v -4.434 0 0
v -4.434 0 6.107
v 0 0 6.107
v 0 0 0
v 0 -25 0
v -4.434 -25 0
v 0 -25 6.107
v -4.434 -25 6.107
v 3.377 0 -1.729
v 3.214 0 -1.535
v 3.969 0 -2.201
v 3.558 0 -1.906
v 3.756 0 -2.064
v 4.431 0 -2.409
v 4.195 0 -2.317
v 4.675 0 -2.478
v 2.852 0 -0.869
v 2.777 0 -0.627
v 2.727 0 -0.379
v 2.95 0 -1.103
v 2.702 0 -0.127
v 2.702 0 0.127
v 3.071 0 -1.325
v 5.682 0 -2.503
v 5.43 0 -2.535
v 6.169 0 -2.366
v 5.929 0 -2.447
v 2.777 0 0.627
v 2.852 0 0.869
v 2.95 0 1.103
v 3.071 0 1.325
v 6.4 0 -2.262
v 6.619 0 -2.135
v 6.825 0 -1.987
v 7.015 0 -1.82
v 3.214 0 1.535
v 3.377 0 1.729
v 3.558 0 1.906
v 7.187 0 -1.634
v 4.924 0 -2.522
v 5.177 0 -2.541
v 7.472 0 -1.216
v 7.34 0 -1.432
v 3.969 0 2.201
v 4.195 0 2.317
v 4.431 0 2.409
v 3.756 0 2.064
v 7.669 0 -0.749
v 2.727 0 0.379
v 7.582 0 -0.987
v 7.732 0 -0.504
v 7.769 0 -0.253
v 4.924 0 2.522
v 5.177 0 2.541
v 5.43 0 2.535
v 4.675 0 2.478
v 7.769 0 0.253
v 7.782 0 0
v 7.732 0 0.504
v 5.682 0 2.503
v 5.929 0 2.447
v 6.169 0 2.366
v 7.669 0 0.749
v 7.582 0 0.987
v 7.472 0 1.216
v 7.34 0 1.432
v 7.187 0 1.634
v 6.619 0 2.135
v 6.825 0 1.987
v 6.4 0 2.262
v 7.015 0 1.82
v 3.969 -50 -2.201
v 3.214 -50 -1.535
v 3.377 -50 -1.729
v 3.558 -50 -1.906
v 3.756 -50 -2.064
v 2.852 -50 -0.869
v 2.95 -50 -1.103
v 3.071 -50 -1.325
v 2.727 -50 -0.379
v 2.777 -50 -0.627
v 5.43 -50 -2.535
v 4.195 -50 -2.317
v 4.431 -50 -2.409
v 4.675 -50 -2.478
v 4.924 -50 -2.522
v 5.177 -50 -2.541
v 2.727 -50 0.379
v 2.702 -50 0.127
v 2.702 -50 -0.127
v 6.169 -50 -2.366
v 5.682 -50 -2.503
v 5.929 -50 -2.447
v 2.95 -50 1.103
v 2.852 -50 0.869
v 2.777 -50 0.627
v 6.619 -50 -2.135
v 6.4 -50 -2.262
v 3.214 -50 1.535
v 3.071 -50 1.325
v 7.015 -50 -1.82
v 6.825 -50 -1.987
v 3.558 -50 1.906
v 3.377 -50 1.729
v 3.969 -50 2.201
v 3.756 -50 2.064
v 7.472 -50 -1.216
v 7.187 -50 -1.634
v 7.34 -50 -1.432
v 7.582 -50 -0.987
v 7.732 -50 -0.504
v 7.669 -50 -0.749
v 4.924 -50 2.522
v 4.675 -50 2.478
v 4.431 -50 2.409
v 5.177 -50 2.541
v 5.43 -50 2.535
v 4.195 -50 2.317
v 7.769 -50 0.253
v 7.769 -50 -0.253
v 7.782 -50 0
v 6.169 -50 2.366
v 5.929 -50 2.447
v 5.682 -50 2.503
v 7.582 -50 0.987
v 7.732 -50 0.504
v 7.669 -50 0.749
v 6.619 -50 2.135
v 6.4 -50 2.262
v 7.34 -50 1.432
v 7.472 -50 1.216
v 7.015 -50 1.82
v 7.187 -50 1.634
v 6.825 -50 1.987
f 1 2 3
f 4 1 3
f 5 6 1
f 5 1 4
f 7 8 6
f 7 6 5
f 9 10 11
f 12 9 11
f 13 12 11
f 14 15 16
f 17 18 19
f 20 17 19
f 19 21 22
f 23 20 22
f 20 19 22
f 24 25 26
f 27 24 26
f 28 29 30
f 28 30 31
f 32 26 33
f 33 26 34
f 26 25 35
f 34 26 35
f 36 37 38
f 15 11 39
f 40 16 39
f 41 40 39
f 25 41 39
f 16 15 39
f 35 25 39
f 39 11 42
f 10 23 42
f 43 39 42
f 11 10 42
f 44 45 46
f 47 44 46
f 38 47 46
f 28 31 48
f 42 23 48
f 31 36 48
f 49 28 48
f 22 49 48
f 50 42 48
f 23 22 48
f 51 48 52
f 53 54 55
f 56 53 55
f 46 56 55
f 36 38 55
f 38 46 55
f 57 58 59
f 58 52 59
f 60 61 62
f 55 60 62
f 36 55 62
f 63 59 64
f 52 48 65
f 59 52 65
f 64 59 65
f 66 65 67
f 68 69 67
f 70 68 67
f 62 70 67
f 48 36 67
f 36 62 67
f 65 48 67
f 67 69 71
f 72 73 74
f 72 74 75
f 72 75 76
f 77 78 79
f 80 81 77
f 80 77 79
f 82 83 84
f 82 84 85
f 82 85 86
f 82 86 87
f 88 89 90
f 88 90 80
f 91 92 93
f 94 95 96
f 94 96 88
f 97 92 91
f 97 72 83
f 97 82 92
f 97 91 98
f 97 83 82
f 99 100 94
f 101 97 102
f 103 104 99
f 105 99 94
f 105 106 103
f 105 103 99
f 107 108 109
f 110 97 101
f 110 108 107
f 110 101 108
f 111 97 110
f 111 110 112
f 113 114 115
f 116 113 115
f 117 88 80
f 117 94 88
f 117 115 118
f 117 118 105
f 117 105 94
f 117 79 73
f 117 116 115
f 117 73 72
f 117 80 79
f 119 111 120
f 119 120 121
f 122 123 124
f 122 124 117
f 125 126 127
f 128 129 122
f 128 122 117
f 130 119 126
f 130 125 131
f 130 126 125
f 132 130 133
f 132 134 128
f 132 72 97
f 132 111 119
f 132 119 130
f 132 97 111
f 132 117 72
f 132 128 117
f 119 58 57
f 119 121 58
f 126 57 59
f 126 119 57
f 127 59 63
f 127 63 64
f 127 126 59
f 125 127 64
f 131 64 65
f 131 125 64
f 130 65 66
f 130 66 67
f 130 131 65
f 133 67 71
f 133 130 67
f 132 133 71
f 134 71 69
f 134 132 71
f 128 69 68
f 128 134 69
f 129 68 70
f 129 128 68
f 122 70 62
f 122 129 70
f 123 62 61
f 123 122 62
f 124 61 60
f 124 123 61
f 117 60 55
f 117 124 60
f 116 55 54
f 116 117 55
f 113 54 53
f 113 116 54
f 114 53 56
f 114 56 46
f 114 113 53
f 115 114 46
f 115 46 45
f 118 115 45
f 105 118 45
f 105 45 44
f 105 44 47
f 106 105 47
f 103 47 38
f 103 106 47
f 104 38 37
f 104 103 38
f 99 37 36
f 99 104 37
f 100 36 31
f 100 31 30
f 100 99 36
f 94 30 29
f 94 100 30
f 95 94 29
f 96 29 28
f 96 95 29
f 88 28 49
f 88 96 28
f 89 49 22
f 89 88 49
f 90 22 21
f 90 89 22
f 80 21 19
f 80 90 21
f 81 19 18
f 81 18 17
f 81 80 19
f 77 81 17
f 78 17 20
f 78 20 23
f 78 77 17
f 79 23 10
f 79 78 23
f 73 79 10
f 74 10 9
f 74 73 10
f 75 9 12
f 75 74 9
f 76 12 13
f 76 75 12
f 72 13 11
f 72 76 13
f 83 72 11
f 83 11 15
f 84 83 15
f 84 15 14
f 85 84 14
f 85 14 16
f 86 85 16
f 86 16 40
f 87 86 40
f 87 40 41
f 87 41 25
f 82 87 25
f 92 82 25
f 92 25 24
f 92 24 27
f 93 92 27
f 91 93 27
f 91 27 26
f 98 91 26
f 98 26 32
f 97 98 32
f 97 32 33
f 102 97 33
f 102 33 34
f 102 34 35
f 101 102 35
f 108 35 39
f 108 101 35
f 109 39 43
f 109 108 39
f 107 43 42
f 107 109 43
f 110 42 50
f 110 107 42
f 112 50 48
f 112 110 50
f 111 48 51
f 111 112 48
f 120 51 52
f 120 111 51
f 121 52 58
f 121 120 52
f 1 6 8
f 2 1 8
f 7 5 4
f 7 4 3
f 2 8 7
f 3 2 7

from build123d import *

# Parameters (mm, degrees)
F0_R     = 10
F1_DEPTH = 25
F5_R     = 2.541772
F2_DEPTH = 25
F3_R     = 10
F3_W     = 4.434139
F3_H     = 6.106716
F3_R_2   = 2.541772
F4_DEPTH = 25.001


with BuildPart() as f1:
    # F0 (on Front) → F1 (new body)
    with BuildSketch(Plane.XZ):
        Circle(F0_R)
    extrude(amount=F1_DEPTH)

    # F5 (on face) → F2 (join)
    with BuildSketch(Plane.XZ.offset(25)):
        with Locations((5.240157, 0)):
            Circle(F5_R)
    extrude(amount=F2_DEPTH)

    # F3 (on face) → F4 (cut, through all)
    with BuildSketch(Plane.XZ.offset(25)):
        Circle(F3_R)
        with Locations((-2.21707, 3.053358)):
            Rectangle(F3_W, F3_H, mode=Mode.SUBTRACT)
        with Locations((5.240157, 0)):
            Circle(F3_R_2, mode=Mode.SUBTRACT)
    extrude(amount=-F4_DEPTH, mode=Mode.SUBTRACT)


solid = f1.part
